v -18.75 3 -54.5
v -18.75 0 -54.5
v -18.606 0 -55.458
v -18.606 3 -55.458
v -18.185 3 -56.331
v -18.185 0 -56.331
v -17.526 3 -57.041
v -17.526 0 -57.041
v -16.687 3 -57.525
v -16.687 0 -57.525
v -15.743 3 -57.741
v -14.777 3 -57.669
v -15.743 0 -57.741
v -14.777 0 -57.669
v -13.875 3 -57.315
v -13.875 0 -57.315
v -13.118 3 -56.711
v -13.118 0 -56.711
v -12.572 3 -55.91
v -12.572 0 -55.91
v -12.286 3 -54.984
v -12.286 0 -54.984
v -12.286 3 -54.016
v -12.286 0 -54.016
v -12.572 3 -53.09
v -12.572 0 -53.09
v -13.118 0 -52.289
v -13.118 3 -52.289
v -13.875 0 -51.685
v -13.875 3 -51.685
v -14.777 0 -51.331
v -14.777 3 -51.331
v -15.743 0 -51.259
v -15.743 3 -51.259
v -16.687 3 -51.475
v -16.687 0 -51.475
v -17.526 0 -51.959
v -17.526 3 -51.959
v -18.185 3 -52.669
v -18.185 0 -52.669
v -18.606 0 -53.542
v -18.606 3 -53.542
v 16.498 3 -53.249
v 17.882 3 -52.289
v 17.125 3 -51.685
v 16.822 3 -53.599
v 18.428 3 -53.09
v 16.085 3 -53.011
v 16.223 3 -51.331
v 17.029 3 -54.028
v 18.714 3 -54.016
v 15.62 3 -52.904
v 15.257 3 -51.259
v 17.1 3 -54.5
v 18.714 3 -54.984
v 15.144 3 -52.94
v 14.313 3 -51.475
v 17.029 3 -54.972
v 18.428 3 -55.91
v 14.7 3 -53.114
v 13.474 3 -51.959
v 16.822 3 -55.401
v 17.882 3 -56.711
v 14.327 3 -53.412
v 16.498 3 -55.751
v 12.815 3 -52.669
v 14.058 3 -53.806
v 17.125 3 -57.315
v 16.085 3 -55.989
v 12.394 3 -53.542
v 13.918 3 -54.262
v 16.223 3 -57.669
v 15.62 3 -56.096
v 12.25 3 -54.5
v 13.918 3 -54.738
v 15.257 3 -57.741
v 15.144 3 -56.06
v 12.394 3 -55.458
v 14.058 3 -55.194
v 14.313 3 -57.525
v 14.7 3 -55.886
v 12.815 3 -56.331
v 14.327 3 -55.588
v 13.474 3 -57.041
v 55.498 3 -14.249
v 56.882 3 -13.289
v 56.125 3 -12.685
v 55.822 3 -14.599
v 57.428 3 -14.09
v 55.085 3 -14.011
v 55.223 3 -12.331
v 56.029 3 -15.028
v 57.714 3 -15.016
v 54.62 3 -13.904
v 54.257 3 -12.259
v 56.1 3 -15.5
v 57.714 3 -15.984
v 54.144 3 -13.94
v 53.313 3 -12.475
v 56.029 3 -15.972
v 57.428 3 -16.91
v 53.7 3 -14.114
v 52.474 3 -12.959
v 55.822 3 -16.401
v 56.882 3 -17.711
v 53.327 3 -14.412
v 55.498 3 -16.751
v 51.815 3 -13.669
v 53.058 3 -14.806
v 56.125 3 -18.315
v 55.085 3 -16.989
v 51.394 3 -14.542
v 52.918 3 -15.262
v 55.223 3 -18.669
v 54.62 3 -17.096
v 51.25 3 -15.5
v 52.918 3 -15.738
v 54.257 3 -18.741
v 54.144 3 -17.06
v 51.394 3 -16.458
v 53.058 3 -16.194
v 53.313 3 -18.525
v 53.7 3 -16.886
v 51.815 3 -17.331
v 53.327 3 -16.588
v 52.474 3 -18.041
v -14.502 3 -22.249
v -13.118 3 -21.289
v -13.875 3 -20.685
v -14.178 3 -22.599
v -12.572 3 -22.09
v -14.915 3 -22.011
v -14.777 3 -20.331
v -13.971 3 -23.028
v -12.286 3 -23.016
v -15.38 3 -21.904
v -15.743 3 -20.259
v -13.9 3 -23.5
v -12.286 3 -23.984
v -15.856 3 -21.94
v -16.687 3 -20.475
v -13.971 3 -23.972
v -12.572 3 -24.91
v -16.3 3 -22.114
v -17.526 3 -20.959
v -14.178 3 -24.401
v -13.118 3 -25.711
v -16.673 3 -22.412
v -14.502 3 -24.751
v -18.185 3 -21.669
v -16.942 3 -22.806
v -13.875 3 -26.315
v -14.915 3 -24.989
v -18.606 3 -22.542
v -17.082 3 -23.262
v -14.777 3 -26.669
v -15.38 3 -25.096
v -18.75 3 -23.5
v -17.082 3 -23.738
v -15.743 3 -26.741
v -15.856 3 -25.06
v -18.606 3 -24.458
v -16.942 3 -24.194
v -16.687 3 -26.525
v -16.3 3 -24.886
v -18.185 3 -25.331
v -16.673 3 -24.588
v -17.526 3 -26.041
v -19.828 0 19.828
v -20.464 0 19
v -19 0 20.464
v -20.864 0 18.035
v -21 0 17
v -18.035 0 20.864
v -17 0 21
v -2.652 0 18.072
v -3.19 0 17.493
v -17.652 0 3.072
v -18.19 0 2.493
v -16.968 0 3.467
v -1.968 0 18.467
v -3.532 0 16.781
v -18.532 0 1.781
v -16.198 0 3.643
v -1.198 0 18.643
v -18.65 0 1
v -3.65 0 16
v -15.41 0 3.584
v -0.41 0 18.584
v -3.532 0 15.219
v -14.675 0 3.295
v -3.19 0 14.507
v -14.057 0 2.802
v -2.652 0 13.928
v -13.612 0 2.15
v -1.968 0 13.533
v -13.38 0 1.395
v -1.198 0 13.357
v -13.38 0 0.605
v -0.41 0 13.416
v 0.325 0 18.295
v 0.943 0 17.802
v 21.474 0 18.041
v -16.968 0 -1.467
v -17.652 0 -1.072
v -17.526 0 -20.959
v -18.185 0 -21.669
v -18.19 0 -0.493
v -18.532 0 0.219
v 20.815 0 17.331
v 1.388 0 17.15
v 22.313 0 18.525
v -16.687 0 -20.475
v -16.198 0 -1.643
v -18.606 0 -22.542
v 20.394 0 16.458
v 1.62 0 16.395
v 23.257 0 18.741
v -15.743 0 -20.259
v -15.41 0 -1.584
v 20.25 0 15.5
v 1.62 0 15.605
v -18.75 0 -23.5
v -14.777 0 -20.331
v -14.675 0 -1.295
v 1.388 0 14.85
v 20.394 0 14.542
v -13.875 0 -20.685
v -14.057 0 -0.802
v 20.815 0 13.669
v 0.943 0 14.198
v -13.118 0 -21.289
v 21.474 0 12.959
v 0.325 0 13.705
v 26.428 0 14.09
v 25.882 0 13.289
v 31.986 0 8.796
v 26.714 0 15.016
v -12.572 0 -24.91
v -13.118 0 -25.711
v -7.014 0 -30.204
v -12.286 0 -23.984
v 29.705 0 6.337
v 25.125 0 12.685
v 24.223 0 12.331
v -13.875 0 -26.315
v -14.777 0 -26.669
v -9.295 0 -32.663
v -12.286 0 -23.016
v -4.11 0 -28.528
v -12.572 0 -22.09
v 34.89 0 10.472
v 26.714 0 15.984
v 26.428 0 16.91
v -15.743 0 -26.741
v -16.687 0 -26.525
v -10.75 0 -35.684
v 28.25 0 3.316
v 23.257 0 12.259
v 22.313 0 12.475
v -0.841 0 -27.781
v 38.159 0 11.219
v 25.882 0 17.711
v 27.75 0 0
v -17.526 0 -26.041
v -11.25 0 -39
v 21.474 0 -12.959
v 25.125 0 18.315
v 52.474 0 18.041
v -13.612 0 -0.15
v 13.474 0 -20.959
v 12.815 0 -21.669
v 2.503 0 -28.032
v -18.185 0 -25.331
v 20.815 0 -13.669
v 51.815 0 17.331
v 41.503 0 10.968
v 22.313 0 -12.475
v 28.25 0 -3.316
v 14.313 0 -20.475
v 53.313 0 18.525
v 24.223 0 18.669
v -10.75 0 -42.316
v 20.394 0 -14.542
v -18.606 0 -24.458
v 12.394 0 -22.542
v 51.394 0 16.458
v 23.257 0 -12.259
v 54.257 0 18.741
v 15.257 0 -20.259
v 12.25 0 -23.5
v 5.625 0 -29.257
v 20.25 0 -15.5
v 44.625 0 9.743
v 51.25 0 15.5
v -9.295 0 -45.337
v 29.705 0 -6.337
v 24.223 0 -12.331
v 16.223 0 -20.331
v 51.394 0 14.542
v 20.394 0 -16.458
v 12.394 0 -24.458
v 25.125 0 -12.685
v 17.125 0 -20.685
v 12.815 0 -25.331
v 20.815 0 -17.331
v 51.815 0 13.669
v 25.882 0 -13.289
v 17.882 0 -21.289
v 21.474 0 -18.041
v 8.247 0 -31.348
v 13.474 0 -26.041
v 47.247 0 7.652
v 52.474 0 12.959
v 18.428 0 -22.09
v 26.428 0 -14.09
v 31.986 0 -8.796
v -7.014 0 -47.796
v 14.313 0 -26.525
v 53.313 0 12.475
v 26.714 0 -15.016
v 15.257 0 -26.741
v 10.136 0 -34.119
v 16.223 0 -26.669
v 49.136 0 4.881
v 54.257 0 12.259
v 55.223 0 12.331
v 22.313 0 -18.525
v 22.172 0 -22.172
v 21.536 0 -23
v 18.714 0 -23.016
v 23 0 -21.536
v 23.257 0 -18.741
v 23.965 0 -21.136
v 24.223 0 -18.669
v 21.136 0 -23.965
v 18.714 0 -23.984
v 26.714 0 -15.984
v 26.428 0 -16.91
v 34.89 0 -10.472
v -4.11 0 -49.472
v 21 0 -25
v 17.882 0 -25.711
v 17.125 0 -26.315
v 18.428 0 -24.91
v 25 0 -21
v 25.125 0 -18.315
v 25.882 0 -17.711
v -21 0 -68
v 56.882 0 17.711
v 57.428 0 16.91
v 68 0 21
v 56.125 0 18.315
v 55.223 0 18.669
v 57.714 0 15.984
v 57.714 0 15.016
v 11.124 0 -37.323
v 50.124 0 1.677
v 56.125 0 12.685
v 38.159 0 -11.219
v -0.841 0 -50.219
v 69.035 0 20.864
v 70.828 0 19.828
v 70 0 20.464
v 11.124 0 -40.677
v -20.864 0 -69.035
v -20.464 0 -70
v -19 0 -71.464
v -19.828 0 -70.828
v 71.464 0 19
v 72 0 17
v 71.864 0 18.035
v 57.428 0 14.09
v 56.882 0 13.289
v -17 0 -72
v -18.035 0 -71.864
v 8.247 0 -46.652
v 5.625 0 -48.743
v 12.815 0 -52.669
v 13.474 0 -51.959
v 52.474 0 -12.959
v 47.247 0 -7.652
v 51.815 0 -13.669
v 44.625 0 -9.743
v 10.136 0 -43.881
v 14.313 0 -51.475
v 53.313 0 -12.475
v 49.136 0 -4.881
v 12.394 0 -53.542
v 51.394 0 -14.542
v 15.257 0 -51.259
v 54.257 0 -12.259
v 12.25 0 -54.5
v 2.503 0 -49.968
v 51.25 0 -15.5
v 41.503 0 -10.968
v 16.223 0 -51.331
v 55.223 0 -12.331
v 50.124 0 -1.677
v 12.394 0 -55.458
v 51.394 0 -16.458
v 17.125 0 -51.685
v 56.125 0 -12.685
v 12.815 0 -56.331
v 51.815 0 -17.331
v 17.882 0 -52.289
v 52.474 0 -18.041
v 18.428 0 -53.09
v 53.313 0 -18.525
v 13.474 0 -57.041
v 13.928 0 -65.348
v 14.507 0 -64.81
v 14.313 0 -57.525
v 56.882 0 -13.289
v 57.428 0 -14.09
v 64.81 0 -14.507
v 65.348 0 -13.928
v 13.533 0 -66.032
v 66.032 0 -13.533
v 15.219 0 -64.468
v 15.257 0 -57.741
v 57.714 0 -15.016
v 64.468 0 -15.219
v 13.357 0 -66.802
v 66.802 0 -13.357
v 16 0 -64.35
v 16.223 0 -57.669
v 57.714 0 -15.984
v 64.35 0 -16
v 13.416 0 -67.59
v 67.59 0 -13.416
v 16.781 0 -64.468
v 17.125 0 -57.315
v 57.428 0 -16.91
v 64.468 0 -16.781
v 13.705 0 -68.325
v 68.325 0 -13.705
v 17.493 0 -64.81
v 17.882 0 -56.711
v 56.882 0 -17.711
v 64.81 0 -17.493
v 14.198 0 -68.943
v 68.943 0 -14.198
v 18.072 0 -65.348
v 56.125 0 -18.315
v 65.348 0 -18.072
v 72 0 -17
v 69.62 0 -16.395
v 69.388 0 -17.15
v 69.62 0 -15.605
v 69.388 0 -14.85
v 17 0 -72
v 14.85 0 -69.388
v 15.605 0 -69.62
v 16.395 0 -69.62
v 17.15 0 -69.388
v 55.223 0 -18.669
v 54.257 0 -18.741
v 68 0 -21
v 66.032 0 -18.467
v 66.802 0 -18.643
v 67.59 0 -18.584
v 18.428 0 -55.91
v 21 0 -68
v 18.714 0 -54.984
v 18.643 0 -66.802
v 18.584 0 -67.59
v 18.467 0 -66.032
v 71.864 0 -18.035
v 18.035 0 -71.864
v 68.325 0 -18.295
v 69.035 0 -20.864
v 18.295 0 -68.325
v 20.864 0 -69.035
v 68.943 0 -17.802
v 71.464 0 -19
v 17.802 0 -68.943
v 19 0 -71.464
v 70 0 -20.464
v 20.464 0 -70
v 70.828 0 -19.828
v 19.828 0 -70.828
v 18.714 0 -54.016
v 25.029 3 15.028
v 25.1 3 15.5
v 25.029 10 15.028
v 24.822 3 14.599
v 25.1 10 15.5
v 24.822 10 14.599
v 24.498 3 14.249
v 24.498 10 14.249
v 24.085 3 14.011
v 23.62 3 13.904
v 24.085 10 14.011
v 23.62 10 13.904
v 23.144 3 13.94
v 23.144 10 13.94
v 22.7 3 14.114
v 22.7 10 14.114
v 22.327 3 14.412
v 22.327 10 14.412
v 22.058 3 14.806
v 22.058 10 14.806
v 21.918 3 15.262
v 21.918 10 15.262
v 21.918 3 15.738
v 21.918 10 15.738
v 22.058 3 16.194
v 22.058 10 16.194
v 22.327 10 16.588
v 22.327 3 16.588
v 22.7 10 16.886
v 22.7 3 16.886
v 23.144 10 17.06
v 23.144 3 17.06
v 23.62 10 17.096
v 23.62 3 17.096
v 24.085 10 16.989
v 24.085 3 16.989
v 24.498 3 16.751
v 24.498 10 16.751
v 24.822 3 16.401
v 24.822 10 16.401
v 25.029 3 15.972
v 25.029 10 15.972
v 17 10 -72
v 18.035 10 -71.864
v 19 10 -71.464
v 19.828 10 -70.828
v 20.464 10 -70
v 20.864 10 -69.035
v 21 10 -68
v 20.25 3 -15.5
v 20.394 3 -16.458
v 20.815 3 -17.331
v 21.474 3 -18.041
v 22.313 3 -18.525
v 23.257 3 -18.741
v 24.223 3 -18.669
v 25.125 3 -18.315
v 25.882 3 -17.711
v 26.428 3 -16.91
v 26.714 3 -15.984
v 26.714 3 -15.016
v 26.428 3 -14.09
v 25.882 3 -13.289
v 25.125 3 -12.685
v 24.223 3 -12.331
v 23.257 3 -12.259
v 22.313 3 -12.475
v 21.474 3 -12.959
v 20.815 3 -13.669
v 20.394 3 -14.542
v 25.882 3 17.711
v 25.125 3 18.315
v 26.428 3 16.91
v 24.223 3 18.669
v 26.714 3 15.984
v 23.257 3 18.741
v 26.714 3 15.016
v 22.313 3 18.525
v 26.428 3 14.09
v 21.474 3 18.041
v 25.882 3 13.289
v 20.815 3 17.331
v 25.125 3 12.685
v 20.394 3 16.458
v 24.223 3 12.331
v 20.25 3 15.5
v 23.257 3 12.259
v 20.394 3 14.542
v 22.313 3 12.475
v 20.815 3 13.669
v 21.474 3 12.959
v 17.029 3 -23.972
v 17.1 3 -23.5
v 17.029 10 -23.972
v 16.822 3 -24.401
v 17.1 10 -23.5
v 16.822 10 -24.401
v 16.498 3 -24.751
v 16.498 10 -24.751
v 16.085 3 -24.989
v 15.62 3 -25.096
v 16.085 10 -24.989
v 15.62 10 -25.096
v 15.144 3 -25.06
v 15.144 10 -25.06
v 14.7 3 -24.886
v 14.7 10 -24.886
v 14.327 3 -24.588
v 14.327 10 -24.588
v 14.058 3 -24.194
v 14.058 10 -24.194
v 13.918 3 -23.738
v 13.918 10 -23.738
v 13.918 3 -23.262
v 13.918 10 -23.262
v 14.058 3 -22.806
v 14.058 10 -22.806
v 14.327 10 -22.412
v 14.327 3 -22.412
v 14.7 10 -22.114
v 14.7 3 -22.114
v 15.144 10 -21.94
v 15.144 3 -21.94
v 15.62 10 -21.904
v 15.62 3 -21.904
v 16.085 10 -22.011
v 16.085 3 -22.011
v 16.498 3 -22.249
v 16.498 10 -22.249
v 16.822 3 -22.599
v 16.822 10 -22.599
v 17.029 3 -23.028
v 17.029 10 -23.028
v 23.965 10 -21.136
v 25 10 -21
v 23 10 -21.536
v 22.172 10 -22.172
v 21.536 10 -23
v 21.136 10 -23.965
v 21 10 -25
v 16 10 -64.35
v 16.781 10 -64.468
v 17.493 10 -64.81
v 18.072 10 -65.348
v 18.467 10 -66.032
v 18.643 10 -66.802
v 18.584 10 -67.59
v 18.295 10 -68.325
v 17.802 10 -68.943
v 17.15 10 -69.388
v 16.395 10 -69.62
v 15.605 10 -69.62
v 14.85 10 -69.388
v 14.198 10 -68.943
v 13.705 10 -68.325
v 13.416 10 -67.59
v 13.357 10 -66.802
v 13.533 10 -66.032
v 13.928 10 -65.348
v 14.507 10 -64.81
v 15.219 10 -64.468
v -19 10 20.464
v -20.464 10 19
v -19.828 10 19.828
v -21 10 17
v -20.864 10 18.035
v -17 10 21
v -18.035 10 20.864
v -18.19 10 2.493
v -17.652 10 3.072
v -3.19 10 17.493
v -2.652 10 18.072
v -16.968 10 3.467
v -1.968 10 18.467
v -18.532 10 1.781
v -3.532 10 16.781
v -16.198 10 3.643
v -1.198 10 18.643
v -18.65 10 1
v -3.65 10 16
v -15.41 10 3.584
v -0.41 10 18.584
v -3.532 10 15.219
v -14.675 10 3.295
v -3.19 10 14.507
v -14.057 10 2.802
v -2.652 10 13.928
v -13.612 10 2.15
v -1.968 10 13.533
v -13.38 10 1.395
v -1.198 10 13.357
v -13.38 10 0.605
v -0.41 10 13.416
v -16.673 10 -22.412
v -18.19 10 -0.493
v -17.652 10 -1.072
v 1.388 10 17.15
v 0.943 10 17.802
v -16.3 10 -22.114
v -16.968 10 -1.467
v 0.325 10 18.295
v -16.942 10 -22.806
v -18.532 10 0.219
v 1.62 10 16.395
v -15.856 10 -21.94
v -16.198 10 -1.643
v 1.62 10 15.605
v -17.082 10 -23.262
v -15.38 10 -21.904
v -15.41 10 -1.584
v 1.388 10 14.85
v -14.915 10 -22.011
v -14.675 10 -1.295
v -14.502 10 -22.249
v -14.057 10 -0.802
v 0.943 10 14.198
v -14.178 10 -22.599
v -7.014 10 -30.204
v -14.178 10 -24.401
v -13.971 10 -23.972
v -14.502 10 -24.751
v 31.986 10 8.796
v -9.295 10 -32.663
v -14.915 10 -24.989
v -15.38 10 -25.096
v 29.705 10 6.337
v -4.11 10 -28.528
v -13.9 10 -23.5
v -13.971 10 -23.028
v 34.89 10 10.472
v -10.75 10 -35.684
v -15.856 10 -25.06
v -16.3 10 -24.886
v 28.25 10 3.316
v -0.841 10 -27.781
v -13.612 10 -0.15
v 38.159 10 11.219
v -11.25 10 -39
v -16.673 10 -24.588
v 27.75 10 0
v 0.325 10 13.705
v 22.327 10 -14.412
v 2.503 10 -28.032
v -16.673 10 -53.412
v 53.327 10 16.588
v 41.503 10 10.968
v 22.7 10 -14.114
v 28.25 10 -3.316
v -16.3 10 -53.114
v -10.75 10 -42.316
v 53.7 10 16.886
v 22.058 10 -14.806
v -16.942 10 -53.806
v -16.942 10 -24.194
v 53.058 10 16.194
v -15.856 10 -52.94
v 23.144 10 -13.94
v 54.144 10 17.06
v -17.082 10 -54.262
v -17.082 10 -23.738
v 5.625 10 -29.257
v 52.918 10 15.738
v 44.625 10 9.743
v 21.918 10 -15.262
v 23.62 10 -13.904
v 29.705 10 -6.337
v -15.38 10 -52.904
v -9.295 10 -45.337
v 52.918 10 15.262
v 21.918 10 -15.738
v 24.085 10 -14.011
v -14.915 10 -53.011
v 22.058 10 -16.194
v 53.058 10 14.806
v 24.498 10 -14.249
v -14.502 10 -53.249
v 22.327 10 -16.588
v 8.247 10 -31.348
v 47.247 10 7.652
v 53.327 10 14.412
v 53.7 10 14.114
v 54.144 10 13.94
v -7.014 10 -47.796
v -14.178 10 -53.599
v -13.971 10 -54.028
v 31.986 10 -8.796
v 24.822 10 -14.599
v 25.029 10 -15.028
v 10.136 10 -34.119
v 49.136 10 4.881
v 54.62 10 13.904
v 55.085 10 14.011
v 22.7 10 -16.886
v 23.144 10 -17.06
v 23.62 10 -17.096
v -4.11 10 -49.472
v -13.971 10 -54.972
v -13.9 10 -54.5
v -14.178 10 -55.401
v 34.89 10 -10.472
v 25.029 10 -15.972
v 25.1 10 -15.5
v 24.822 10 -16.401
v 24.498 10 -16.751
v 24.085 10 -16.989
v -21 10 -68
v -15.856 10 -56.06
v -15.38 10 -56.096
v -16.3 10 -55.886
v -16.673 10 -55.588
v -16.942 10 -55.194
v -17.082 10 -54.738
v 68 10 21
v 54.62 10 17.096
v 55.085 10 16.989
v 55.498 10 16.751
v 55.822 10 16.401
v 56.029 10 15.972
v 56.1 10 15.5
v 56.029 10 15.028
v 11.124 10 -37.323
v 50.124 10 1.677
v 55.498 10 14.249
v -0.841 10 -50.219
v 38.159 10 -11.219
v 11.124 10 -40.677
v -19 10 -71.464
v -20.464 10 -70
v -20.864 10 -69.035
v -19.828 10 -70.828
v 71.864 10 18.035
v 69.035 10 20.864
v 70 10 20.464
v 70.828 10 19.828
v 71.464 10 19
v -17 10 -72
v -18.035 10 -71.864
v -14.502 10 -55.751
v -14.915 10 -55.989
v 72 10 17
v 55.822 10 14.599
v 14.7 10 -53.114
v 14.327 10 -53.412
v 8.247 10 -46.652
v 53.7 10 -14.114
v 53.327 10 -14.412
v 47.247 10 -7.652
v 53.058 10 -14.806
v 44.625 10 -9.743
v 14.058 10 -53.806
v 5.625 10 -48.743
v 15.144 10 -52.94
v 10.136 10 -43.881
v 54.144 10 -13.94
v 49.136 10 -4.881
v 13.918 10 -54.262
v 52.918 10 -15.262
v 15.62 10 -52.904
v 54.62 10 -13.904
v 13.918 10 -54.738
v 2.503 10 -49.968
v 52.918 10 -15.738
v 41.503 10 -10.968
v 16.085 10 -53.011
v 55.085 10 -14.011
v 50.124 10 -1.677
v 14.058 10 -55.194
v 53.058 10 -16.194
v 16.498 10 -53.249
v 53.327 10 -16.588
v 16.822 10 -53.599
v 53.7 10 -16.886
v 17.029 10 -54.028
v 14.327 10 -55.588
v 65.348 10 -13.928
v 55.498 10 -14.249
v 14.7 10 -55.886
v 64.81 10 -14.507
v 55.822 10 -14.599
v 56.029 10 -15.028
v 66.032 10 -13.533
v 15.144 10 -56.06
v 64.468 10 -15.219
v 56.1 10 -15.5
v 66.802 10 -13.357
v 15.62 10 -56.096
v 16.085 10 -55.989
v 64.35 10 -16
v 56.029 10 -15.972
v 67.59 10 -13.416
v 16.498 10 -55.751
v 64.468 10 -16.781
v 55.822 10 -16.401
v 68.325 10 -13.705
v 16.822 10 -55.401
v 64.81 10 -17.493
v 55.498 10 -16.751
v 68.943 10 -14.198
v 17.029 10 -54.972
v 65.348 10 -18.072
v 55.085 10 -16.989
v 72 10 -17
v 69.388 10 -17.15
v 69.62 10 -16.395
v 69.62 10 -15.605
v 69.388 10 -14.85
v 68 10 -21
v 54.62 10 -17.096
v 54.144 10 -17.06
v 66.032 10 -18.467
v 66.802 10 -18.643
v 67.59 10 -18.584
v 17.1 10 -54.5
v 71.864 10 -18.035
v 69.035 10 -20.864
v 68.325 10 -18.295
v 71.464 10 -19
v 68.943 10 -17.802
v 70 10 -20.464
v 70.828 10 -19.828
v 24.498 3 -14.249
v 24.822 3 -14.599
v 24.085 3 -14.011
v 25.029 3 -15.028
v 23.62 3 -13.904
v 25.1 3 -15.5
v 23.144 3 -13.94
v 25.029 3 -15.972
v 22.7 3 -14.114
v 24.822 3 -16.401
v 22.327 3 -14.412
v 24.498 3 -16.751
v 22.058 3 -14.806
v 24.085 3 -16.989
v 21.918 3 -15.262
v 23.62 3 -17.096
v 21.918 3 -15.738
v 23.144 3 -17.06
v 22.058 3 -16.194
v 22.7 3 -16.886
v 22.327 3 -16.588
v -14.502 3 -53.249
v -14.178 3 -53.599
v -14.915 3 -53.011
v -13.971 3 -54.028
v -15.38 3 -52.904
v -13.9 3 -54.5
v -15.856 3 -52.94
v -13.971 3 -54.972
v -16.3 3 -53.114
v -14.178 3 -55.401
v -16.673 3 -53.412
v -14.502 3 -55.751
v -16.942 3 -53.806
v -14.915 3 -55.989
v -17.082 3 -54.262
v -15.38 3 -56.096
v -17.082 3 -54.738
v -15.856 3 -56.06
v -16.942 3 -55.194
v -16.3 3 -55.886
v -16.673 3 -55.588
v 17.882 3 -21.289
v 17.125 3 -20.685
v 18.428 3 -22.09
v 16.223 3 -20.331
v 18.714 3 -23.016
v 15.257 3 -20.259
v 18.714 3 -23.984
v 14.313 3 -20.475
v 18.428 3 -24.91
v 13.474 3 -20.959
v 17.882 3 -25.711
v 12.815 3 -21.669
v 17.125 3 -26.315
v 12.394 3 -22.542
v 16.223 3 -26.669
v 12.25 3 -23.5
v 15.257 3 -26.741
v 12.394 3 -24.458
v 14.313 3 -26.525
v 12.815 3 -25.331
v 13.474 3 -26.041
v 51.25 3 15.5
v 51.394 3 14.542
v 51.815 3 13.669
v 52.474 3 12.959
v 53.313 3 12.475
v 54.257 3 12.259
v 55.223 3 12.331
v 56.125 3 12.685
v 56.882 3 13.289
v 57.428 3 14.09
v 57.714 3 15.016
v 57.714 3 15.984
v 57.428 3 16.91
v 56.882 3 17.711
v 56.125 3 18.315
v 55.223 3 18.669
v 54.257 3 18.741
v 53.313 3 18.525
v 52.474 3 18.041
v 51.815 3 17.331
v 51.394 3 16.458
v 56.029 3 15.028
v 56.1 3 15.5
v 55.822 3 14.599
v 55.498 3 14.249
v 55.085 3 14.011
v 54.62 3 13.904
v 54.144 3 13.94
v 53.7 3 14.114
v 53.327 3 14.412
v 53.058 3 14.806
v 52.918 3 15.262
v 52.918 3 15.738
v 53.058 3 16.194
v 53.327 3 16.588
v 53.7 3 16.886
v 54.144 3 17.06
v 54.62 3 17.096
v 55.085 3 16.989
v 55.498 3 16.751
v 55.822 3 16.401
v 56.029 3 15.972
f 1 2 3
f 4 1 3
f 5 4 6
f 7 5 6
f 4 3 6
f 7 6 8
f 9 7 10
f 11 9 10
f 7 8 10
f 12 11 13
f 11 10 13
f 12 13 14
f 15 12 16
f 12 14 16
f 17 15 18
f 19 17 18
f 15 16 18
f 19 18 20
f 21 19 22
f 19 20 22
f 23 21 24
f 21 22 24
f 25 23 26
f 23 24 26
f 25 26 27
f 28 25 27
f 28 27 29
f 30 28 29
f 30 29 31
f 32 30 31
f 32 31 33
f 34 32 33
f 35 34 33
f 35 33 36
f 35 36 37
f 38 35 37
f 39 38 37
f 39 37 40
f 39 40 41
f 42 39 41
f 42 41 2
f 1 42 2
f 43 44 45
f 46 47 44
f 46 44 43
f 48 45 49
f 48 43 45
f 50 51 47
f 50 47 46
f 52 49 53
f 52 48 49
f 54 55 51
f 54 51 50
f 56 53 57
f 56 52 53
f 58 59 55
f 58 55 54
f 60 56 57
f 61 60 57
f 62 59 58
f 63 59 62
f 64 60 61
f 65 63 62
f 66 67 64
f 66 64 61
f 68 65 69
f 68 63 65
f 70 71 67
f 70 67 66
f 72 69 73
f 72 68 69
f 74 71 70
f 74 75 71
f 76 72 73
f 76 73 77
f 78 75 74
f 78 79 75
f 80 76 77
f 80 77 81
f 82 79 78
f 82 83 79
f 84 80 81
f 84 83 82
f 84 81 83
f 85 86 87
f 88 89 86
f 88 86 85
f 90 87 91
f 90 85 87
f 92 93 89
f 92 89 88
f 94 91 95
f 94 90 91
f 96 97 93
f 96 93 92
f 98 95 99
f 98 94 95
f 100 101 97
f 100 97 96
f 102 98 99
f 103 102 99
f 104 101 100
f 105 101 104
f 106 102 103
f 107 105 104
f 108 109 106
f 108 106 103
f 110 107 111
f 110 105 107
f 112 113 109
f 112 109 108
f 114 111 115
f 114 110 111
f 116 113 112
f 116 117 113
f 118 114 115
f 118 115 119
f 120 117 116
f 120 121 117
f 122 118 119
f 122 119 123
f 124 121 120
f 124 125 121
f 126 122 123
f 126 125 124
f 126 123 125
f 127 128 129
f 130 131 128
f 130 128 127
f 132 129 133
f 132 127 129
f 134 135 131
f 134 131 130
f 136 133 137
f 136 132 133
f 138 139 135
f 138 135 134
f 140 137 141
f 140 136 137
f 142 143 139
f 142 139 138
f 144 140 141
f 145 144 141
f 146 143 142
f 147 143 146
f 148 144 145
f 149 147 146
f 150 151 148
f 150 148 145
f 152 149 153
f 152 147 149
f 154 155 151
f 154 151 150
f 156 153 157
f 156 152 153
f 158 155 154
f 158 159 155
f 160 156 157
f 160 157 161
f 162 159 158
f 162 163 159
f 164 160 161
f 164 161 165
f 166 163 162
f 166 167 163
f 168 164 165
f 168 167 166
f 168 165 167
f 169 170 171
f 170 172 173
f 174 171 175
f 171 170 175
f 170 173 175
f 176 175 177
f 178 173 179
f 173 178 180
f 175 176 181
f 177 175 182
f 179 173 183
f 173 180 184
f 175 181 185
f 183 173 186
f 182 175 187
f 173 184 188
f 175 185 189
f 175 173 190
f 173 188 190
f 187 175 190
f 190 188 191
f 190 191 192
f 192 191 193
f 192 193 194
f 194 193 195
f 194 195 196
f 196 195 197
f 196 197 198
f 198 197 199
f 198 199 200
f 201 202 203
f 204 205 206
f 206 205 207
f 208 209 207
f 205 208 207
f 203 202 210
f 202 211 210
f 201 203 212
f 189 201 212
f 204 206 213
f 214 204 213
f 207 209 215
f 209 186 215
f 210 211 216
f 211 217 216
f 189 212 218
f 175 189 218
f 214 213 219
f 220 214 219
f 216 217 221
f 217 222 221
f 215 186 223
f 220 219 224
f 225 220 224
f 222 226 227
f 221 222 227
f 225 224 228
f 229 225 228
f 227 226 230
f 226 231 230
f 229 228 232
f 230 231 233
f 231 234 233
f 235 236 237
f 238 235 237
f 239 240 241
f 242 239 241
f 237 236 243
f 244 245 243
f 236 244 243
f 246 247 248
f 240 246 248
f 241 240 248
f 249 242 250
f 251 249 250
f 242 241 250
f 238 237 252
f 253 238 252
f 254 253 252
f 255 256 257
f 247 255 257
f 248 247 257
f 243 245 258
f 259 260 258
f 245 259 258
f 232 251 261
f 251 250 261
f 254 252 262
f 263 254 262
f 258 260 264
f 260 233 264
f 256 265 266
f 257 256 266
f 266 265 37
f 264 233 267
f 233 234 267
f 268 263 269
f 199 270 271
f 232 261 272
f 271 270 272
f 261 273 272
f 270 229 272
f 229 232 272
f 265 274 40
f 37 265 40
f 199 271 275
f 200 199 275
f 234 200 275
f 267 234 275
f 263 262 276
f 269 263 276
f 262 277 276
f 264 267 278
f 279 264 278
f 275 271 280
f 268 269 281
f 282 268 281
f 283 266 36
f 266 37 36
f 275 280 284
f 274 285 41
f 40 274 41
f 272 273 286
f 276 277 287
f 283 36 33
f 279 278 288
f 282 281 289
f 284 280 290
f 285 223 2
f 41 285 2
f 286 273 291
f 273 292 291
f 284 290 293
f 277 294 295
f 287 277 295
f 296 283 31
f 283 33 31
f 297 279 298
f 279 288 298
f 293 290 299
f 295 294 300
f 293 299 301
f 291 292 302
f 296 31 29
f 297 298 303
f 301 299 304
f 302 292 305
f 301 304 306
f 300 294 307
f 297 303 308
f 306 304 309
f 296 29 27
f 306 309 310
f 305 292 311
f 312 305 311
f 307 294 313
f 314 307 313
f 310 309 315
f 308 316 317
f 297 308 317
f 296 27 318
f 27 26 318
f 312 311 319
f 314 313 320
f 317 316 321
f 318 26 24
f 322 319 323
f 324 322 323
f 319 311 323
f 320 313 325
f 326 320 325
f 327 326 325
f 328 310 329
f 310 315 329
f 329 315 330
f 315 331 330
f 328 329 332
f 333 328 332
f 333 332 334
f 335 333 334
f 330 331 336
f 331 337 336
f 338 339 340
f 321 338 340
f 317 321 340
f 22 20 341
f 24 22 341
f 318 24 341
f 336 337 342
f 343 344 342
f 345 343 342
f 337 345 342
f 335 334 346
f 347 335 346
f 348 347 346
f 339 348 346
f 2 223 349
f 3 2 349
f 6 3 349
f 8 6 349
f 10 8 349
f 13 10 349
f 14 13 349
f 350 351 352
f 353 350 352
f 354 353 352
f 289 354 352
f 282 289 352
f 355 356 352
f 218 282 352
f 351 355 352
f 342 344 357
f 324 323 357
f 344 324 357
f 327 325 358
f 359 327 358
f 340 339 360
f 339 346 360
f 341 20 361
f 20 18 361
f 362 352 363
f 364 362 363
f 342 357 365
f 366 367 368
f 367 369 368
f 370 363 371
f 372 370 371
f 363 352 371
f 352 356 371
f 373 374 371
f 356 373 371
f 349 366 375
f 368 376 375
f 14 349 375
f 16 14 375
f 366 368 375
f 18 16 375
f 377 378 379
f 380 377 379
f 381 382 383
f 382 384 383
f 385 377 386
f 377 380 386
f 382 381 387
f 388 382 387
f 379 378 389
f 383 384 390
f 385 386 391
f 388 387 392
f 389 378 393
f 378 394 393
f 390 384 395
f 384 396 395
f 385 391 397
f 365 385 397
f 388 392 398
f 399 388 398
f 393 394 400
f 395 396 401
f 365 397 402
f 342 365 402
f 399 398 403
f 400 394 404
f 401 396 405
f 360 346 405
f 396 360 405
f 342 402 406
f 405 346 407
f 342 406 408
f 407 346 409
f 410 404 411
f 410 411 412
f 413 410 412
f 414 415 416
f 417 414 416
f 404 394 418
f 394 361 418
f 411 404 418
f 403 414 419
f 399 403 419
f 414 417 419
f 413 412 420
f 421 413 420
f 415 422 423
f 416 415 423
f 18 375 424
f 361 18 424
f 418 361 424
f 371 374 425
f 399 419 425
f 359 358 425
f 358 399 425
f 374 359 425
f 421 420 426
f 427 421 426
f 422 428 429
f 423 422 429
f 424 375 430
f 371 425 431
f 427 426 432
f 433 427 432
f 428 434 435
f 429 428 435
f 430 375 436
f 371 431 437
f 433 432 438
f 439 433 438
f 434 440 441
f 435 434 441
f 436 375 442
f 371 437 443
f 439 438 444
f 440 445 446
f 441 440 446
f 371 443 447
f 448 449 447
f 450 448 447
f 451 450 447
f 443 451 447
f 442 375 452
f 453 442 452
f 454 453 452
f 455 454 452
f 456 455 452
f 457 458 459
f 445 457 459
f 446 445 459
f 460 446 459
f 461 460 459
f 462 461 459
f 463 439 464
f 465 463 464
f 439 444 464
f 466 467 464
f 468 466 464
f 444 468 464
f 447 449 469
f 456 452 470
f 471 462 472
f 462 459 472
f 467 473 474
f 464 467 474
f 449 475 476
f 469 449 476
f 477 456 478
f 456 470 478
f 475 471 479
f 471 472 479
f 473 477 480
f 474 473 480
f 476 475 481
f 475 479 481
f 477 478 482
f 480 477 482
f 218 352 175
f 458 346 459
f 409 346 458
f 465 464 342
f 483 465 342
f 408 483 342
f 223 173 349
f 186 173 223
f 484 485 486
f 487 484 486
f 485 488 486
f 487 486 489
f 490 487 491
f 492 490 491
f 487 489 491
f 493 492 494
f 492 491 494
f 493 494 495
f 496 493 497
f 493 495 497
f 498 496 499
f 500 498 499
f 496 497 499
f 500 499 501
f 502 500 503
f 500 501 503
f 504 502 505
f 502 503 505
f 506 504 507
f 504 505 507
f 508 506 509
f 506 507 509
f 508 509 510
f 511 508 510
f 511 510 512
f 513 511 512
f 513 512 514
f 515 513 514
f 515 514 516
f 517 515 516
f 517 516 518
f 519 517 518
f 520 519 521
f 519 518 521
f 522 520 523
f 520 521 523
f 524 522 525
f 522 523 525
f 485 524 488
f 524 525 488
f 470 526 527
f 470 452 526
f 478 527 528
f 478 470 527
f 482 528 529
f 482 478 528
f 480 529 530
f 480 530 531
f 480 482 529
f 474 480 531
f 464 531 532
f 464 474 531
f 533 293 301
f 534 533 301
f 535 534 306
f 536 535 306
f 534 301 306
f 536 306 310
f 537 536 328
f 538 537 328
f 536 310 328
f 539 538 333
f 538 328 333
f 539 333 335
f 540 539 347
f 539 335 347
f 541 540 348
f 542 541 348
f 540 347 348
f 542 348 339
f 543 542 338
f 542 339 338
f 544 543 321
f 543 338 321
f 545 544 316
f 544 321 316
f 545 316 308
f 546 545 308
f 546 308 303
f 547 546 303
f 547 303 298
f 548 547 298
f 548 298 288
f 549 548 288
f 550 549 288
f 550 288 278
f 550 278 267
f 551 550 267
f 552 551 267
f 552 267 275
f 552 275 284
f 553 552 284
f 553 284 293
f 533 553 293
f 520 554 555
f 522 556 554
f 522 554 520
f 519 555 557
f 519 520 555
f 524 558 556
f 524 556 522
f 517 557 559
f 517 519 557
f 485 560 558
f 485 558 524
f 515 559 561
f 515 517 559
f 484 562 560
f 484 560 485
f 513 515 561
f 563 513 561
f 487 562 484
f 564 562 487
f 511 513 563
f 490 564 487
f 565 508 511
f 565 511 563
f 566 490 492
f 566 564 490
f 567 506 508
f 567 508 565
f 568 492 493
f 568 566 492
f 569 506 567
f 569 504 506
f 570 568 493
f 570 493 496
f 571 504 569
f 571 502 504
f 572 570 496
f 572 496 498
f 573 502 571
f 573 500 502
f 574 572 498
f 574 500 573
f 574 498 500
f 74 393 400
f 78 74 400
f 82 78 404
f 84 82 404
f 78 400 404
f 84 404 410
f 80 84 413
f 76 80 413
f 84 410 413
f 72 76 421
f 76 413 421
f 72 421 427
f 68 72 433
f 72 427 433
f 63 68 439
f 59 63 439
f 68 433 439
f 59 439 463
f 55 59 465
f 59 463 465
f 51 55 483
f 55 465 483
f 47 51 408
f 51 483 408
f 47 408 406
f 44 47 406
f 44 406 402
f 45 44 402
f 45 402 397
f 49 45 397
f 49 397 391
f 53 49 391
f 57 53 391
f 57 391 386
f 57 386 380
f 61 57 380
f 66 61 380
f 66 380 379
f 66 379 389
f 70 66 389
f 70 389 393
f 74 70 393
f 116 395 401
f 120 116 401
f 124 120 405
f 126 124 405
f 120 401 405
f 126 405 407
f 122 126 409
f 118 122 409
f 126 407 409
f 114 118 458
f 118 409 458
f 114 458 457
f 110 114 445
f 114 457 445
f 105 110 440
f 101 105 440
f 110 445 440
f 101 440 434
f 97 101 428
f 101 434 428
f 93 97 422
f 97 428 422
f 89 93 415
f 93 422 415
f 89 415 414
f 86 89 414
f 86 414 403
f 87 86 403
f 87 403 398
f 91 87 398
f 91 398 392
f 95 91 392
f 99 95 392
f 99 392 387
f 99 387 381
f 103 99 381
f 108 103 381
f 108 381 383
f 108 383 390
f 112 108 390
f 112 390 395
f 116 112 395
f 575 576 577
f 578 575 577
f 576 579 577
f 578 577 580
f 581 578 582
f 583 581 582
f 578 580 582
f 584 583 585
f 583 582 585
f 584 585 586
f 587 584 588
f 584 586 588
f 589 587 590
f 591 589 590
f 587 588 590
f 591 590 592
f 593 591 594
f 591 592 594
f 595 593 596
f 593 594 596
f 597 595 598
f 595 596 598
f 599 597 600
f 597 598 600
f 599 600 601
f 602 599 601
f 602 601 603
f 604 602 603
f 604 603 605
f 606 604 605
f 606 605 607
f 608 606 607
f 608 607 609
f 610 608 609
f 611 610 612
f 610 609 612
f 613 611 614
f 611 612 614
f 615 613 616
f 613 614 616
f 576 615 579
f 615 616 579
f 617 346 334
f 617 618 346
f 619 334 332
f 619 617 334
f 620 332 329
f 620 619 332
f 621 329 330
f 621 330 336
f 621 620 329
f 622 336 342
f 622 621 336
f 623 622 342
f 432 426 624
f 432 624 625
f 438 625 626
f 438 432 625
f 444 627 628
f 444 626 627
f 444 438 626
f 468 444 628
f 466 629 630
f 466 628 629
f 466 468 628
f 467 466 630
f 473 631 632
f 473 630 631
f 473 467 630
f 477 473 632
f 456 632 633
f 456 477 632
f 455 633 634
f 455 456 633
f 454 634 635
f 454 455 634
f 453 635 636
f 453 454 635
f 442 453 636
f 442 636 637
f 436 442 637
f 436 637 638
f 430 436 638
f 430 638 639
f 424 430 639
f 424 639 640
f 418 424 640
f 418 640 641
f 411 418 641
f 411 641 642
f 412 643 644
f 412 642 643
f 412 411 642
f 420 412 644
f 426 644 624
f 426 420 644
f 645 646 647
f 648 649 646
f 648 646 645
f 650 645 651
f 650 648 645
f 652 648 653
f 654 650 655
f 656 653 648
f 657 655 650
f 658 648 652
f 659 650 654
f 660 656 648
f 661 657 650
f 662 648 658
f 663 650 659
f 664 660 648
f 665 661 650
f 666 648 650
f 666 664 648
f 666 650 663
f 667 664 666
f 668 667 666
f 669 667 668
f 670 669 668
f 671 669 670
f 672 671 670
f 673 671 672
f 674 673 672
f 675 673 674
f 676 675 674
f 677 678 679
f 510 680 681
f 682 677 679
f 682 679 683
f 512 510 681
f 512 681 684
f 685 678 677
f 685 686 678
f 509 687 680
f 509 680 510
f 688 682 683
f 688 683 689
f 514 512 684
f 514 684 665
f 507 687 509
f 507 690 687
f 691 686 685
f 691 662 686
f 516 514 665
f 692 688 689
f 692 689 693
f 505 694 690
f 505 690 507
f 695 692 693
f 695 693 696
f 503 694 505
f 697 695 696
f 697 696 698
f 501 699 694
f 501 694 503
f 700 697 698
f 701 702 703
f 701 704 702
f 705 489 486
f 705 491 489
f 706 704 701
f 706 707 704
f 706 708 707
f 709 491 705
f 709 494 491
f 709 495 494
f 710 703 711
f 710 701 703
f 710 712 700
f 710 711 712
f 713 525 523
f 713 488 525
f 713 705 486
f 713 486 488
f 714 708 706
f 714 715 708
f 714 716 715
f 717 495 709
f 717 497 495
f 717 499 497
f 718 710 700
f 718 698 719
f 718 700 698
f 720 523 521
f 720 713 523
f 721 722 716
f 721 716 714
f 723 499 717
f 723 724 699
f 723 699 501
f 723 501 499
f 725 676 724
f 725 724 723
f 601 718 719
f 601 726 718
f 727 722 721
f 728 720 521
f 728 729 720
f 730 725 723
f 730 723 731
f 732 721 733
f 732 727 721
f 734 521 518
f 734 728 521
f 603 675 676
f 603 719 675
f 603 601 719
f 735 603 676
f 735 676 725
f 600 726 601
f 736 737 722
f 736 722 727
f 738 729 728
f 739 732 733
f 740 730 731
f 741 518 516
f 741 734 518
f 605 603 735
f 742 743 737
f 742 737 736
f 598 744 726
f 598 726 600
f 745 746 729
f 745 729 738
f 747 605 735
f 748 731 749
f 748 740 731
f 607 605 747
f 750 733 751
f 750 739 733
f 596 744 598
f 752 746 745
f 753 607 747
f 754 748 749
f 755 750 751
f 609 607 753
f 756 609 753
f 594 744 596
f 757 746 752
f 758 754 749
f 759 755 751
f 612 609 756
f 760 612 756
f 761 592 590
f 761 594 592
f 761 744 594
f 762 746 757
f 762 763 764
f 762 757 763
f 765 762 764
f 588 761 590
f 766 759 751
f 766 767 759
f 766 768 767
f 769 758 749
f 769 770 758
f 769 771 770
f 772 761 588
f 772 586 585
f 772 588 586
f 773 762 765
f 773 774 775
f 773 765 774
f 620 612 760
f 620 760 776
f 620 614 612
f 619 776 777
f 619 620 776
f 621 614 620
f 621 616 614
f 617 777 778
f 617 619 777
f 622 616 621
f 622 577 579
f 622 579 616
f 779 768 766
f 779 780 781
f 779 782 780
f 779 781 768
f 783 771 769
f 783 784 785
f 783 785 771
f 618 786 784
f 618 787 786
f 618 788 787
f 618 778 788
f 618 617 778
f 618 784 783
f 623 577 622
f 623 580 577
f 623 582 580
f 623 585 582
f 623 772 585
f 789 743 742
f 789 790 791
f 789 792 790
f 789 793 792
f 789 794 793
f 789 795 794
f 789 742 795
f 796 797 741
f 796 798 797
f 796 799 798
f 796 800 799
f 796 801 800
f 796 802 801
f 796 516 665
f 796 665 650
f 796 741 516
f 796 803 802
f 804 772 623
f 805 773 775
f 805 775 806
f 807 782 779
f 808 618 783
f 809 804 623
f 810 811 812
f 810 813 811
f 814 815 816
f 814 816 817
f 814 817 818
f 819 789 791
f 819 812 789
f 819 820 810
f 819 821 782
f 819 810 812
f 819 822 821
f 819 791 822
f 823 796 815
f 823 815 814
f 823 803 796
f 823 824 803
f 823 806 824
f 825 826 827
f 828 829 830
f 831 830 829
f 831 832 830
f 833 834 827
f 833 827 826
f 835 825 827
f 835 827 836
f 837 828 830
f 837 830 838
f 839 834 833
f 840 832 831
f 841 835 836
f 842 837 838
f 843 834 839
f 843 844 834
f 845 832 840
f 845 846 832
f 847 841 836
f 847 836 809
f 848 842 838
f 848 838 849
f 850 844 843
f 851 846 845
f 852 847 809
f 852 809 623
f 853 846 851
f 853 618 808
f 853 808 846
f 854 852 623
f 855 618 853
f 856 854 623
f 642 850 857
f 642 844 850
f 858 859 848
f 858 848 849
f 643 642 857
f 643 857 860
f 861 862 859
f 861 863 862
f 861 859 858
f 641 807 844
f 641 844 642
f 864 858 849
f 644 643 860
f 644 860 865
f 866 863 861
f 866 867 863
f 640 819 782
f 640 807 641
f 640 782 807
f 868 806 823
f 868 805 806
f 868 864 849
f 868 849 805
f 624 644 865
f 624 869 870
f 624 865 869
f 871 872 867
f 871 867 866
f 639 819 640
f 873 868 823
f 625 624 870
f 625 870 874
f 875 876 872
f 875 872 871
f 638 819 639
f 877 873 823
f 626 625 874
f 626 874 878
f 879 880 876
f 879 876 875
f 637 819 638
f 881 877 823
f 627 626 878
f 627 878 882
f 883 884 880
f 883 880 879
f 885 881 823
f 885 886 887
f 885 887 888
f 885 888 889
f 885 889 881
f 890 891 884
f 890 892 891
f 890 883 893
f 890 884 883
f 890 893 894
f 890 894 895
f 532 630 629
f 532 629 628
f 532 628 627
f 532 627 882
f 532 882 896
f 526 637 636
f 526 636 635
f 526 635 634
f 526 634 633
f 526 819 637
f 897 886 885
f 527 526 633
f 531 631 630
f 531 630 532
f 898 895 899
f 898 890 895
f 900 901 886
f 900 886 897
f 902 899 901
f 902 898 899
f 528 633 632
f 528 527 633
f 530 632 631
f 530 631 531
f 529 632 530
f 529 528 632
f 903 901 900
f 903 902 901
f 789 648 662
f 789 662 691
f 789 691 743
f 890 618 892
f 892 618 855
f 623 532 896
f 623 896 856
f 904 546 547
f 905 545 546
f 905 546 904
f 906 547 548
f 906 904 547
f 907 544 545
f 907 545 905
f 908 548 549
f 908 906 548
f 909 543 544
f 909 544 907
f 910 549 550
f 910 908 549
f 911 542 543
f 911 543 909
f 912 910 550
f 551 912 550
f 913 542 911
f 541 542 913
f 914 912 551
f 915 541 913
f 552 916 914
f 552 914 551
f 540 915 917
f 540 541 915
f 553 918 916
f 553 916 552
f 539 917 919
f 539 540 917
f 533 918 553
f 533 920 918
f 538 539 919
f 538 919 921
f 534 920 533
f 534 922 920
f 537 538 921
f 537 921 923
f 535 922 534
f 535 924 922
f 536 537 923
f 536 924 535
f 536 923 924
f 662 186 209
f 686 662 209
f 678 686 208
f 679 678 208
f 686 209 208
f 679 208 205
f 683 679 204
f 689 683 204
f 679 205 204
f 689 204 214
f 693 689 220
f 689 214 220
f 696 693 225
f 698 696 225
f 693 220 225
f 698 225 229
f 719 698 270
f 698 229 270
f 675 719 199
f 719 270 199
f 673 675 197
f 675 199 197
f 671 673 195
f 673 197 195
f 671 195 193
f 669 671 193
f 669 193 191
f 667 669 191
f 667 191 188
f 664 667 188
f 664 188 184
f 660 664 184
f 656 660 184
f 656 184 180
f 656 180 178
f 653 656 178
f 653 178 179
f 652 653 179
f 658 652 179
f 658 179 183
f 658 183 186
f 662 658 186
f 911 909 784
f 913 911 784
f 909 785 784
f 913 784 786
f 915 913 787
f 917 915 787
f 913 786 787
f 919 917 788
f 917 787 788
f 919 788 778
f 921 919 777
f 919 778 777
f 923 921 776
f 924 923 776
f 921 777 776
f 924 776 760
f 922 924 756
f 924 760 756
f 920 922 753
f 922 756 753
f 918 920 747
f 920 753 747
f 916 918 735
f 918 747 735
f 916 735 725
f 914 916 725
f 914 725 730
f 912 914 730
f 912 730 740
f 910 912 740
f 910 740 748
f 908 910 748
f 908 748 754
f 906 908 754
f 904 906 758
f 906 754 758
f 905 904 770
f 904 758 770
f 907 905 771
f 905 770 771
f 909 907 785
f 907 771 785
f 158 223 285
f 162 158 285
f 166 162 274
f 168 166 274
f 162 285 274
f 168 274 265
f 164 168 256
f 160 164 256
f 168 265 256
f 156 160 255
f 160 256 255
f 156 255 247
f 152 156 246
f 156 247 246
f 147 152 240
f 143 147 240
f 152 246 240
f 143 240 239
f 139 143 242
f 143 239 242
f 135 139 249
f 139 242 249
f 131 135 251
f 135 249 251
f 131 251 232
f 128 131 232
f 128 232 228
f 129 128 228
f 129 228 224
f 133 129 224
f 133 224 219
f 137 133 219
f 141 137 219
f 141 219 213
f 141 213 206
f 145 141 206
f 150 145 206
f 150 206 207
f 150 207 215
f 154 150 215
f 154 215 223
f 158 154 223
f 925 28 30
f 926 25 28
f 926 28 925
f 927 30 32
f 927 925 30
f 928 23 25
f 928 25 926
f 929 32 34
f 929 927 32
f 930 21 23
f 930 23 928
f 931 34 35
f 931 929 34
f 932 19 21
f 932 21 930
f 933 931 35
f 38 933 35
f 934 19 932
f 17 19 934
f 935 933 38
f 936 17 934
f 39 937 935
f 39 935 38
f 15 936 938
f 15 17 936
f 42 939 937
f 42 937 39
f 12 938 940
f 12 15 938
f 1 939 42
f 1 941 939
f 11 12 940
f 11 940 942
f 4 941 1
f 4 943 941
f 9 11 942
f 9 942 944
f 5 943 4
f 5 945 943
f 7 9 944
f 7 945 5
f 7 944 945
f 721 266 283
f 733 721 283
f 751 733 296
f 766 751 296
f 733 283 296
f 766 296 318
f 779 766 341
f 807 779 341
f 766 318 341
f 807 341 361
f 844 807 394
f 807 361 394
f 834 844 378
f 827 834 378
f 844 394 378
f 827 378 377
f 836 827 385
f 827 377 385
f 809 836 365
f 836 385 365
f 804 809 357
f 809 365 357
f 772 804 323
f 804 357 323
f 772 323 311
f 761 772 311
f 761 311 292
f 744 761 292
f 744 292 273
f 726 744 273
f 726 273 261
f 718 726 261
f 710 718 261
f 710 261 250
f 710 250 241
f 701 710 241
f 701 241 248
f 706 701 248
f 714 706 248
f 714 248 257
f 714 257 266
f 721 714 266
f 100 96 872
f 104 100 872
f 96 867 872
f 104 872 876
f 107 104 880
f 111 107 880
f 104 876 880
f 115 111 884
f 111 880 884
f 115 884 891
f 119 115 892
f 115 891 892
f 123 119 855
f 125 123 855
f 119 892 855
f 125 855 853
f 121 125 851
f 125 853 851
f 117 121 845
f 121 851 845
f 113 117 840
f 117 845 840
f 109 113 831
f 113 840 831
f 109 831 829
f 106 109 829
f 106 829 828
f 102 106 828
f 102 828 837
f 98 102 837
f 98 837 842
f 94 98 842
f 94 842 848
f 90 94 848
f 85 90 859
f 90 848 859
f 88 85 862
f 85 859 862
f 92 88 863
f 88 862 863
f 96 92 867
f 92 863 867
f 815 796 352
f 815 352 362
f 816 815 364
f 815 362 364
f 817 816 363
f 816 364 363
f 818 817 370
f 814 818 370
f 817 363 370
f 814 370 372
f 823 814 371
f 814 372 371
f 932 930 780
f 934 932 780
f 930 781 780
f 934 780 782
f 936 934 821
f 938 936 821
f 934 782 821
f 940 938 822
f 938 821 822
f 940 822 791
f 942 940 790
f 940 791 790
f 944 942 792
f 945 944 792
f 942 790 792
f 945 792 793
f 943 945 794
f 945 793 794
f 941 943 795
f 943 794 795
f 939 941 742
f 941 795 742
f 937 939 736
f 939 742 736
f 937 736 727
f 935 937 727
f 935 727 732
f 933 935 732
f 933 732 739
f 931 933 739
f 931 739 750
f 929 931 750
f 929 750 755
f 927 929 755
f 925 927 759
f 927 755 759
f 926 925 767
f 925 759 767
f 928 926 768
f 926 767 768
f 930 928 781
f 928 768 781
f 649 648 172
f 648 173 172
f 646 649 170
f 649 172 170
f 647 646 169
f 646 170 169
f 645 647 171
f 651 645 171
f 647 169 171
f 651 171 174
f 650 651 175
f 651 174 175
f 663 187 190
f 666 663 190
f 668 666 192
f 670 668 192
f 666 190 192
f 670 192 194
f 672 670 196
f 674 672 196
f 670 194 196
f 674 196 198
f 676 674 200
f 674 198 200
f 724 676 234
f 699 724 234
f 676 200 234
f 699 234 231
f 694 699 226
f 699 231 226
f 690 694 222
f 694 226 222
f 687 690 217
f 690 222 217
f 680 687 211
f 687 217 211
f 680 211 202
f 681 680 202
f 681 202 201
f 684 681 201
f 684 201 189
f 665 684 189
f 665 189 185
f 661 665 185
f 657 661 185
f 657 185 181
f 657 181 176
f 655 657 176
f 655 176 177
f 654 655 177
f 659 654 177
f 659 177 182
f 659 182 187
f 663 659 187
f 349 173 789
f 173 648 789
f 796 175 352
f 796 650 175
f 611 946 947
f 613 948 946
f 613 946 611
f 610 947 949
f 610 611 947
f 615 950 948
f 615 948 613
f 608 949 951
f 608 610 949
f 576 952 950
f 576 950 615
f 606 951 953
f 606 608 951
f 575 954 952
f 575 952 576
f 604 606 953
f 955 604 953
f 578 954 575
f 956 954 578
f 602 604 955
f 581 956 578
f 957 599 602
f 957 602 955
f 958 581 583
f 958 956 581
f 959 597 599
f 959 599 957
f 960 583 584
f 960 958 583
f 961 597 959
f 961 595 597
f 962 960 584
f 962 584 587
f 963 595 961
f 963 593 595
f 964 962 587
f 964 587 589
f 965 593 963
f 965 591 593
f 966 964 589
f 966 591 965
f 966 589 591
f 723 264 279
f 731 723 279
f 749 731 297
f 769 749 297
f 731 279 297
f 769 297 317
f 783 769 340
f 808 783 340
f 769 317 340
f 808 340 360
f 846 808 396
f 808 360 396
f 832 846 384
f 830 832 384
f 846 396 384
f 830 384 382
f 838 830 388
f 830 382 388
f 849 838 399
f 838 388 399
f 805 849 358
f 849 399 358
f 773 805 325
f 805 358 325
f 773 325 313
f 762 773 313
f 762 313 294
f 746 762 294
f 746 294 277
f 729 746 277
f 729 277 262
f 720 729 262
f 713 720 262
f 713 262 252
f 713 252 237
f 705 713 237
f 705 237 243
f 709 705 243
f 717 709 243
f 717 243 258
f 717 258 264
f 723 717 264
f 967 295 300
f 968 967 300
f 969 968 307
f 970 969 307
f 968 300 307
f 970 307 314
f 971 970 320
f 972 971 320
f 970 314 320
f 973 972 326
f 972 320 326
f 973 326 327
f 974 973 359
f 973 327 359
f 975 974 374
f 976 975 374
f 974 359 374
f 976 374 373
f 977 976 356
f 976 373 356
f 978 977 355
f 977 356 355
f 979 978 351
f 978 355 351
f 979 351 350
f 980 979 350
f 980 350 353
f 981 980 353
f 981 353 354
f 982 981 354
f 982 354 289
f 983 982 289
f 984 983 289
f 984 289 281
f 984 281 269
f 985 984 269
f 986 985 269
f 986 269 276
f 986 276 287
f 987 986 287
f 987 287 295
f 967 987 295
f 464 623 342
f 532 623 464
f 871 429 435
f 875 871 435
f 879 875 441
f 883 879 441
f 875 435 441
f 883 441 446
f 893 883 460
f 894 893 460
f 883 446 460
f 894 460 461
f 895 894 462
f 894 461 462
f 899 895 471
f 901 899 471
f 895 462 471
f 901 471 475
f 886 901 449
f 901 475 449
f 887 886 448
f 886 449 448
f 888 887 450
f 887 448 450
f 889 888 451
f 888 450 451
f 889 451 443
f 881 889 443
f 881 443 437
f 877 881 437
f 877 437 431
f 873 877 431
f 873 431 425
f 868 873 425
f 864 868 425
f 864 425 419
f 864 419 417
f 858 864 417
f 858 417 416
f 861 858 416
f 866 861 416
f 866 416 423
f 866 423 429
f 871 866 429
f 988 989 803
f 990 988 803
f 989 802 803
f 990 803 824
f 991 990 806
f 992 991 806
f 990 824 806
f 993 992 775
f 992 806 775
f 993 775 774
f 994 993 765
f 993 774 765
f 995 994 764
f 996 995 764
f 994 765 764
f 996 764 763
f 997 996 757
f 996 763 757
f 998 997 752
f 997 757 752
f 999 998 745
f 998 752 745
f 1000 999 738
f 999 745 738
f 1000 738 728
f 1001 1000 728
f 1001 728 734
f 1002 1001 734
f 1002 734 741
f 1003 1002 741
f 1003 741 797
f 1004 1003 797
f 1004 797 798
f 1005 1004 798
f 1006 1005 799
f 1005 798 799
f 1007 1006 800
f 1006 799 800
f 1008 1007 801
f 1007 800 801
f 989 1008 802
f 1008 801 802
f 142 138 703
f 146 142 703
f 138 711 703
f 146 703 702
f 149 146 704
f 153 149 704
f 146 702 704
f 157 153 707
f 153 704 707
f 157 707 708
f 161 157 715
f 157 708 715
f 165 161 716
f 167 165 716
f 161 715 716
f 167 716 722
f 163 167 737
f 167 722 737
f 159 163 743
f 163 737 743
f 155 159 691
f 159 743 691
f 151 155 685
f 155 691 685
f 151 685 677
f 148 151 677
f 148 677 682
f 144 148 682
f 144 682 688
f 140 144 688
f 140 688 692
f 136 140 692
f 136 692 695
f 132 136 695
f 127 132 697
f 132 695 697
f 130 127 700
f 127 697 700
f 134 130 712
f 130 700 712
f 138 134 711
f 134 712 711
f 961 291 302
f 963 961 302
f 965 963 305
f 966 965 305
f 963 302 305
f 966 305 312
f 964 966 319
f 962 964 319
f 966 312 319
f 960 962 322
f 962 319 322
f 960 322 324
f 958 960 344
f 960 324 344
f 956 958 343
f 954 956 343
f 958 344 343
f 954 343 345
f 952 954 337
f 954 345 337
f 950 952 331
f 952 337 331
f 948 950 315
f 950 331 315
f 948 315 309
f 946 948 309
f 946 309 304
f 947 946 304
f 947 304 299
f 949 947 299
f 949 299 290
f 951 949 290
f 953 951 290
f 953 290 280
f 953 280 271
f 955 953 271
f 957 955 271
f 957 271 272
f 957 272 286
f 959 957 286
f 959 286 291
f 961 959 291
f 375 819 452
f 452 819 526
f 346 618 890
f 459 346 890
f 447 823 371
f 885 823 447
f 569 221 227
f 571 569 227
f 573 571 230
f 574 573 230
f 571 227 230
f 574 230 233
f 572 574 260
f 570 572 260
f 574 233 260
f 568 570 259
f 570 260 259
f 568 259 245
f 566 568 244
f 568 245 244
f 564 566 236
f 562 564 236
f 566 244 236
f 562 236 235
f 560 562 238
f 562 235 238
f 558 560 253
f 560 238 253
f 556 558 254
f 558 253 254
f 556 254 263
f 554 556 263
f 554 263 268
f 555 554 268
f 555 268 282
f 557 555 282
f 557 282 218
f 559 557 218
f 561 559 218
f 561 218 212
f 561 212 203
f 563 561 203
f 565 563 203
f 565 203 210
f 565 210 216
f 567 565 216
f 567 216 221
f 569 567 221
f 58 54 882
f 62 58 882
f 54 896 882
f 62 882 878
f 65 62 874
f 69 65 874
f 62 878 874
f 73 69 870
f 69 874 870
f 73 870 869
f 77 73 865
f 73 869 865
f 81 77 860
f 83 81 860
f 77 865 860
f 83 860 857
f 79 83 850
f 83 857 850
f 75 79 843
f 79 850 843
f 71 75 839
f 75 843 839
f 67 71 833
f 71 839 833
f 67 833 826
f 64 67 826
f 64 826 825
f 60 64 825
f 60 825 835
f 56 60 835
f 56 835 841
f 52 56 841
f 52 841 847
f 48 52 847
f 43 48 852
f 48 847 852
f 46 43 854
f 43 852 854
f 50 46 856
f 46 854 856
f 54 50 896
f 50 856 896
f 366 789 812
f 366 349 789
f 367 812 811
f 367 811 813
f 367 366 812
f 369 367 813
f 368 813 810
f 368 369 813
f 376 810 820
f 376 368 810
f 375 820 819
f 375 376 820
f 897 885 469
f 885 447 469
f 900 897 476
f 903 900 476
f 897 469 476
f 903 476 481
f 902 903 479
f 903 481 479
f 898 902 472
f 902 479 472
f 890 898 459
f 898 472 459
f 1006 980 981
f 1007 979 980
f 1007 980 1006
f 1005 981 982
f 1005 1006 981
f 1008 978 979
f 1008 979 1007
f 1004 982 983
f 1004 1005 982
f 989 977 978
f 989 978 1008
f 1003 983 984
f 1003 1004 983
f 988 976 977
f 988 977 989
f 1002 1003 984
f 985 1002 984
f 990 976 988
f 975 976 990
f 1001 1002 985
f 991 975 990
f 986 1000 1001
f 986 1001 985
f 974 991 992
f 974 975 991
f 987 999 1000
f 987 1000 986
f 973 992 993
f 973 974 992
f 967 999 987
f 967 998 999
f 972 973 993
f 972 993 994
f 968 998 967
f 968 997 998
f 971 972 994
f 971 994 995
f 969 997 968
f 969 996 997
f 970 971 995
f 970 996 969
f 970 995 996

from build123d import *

# Parameters (mm, degrees)
BOSS_EXTRUDE1_DEPTH            = 10
F_22_5_22_5_DIAMETER_HOLE1_D   = 22.5
CBORE_FOR_M3_SHCS1_D           = 3.2
CBORE_FOR_M3_SHCS1_CBORE_D     = 6.5
CBORE_FOR_M3_SHCS1_CBORE_DEPTH = 3
BOSS_EXTRUDE2_DEPTH            = 10
SKETCH17_W                     = 12
SKETCH17_H                     = 42
BOSS_EXTRUDE3_DEPTH            = 10
M5_CLEARANCE_HOLE1_D           = 5.3
SKETCH20_W                     = 38.1
SKETCH20_H                     = 38.1
BOSS_EXTRUDE4_DEPTH            = 10
M5_CLEARANCE_HOLE2_D           = 5.3
FILLET6_R                      = 4


with BuildPart() as part:
    # Sketch1 → Boss-Extrude1 (new body)
    with BuildSketch(Plane(origin=(0, 0, 0), x_dir=(1, 0, 0), z_dir=(0, 1, 0))):
        Polygon((60, -21), (60, 21), (21, 21), (21, 60), (-21, 60), (-21, 18), (18, 18), (18, -21), align=None)
    extrude(amount=BOSS_EXTRUDE1_DEPTH)

    # Ø22.5 (22.5) Diameter Hole1 (through all)
    with Locations(Plane(origin=(0, 10, 0), x_dir=(1, 0, 0), z_dir=(0, 1, 0))):
        with Locations((0, 39), (39, 0)):
            Hole(F_22_5_22_5_DIAMETER_HOLE1_D / 2)

    # CBORE for M3 SHCS1 (through all)
    with Locations(Plane(origin=(0, 0, 0), x_dir=(-1, 0, 0), z_dir=(0, -1, 0))):
        with Locations((-54.5, 15.5), (-23.5, 15.5), (-23.5, -15.5), (-54.5, -15.5), (-15.5, 54.5), (-15.5, 23.5), (15.5, 23.5), (15.5, 54.5)):
            CounterBoreHole(CBORE_FOR_M3_SHCS1_D / 2, CBORE_FOR_M3_SHCS1_CBORE_D / 2, CBORE_FOR_M3_SHCS1_CBORE_DEPTH)

    # Sketch16 → Boss-Extrude2 (add)
    with BuildSketch(Plane(origin=(0, 10, 0), x_dir=(1, 0, 0), z_dir=(0, 1, 0))):
        Polygon((17.1, 17.1), (-21, 17.1), (-21, 18), (18, 18), (18, -21), (17.1, -21), align=None)
    extrude(amount=-BOSS_EXTRUDE2_DEPTH)

    # Sketch17 → Boss-Extrude3 (add)
    with BuildSketch(Plane(origin=(0, 10, 0), x_dir=(1, 0, 0), z_dir=(0, 1, 0))):
        with Locations((66, 0)):
            Rectangle(SKETCH17_W, SKETCH17_H)
    boss_extrude3 = extrude(amount=-BOSS_EXTRUDE3_DEPTH)

    # M5 Clearance Hole1 (through all)
    with Locations(Plane(origin=(0, 10, 0), x_dir=(1, 0, 0), z_dir=(0, 1, 0))):
        with Locations((67, 16)):
            m5_clearance_hole1 = Hole(M5_CLEARANCE_HOLE1_D / 2)

    # Mirror1: Boss-Extrude3, M5 Clearance Hole1 across plane
    add(boss_extrude3.mirror(Plane(origin=(0, 0, 0), x_dir=(-0.7071067811865477, 0, 0.7071067811865474), z_dir=(0.7071067811865476, 0, 0.7071067811865476))))
    add(m5_clearance_hole1.mirror(Plane(origin=(0, 0, 0), x_dir=(-0.7071067811865477, 0, 0.7071067811865474), z_dir=(0.7071067811865476, 0, 0.7071067811865476))), mode=Mode.SUBTRACT)

    # Sketch20 → Boss-Extrude4 (add)
    with BuildSketch(Plane(origin=(0, 10, 0), x_dir=(1, 0, 0), z_dir=(0, 1, 0))):
        with Locations((-1.95, -1.95)):
            Rectangle(SKETCH20_W, SKETCH20_H)
    extrude(amount=-BOSS_EXTRUDE4_DEPTH)

    # M5 Clearance Hole2 (through all)
    with Locations(Plane(origin=(0, 10, 0), x_dir=(1, 0, 0), z_dir=(0, 1, 0))):
        with Locations((-16, -1), (-1, -16)):
            Hole(M5_CLEARANCE_HOLE2_D / 2)

    # Fillet6
    fillet6_edges = [part.edges().sort_by_distance(p)[0] for p in [
        (72, 5, -21),
        (72, 5, 21),
        (21, 5, -72),
        (-21, 5, -72),
        (21, 5, -21),
        (-21, 5, 21),
    ]]
    fillet(fillet6_edges, radius=FILLET6_R)


solid = part.part
